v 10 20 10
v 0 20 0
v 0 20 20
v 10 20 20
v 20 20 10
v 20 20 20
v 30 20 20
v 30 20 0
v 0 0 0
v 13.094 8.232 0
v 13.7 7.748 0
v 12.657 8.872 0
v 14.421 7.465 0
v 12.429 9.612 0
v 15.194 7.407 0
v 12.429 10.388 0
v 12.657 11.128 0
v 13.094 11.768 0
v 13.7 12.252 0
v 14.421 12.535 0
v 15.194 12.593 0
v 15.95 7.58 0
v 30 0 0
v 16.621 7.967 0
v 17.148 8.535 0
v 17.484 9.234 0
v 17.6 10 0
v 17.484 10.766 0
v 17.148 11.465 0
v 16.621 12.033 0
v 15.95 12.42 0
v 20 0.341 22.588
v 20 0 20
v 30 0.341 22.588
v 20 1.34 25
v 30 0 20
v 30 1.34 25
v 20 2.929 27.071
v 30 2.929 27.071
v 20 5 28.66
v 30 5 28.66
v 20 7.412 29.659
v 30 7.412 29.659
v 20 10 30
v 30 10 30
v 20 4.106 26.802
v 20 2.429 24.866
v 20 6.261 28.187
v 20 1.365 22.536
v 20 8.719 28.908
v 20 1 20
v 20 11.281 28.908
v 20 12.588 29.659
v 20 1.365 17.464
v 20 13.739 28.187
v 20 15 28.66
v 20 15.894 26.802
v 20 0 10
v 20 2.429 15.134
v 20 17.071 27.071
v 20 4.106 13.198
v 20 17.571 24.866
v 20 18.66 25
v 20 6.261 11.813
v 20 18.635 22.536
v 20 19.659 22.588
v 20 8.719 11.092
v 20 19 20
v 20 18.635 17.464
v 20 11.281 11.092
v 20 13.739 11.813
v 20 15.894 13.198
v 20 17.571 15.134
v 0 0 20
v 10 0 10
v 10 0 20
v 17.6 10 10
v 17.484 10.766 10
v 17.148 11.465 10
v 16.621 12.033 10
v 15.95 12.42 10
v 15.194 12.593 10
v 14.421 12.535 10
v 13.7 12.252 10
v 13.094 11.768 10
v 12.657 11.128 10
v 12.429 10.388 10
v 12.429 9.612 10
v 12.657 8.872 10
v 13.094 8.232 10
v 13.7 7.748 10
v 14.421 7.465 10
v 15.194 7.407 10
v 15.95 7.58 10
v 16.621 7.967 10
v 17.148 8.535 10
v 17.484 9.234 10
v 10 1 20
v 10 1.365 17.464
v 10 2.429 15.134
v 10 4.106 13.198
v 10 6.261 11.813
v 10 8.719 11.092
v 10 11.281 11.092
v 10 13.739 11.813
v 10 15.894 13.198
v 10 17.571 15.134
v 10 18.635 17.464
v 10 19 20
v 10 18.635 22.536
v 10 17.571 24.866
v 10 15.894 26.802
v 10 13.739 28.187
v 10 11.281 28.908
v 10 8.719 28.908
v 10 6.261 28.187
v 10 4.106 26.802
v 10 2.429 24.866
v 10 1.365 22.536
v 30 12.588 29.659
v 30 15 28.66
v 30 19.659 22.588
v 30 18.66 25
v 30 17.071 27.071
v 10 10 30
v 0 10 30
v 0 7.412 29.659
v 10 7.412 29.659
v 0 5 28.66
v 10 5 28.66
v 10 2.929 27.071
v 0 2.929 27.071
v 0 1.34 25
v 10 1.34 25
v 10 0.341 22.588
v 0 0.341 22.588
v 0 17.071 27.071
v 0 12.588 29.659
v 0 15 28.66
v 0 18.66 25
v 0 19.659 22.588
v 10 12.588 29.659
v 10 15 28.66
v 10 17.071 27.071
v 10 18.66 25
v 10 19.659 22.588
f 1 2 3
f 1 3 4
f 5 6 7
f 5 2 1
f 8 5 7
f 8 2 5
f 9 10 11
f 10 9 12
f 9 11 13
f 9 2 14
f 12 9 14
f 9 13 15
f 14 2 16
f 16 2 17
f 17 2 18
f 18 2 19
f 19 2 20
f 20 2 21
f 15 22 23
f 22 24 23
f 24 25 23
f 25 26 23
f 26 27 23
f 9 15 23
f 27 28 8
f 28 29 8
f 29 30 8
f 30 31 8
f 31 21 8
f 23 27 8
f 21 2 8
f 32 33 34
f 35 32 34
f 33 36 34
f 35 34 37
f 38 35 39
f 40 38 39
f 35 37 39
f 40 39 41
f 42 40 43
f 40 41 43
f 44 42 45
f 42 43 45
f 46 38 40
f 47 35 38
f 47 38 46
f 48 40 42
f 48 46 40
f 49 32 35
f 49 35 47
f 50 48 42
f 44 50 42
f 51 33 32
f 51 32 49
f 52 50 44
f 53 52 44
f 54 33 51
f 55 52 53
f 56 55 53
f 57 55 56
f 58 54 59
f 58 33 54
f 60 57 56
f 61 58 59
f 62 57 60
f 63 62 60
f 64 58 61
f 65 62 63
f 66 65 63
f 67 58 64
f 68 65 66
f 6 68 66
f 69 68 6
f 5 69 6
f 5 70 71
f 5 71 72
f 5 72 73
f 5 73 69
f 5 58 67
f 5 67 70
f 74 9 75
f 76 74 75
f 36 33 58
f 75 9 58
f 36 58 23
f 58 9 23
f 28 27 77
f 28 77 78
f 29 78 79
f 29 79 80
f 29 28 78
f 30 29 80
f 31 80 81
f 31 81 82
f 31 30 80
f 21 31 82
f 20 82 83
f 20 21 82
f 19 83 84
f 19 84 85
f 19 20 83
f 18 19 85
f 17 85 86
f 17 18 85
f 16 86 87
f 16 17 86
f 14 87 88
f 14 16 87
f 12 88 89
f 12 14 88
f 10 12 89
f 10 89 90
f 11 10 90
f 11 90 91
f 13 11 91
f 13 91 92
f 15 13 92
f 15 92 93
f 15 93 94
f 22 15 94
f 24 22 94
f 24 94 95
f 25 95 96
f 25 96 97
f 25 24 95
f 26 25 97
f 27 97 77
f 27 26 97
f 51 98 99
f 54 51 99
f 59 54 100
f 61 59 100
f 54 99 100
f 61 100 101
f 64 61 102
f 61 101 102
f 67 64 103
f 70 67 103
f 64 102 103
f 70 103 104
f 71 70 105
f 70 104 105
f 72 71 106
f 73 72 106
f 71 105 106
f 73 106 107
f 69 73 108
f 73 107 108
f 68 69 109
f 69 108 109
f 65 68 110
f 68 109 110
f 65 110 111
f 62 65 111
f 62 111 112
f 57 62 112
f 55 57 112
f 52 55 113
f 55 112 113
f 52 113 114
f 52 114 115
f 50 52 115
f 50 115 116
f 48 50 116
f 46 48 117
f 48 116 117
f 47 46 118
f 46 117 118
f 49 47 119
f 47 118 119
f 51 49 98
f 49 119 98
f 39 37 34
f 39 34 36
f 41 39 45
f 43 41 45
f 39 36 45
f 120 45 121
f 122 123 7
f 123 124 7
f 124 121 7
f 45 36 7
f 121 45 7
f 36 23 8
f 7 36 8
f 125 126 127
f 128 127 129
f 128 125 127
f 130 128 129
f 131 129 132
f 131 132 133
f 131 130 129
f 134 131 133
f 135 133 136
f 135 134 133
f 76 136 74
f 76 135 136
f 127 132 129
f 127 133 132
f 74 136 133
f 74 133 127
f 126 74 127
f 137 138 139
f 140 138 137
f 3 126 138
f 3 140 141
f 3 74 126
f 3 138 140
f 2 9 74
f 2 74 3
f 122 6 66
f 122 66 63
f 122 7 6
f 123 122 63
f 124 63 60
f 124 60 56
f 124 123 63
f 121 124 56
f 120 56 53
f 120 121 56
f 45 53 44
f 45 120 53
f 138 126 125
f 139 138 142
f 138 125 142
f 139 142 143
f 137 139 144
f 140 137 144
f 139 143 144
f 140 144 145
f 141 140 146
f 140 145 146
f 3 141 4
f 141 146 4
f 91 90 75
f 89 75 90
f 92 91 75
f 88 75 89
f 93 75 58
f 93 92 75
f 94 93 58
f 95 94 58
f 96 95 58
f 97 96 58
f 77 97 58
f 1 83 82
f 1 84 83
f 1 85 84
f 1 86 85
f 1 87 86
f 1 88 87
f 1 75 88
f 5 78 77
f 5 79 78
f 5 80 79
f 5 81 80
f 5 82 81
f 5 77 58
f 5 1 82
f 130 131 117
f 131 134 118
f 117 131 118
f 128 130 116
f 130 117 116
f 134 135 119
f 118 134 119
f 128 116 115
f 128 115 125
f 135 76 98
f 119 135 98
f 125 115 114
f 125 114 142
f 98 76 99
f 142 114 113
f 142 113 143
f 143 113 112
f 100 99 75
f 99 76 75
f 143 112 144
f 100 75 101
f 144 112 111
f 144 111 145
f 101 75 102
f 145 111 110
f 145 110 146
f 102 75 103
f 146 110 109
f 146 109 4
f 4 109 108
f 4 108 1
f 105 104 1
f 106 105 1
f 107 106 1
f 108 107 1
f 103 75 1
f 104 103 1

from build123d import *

# Parameters (mm, degrees)
SZKIC1_W                    = 30
SZKIC1_H                    = 20
SZKIC1_R                    = 2.6
DODANIE_WYCI_GNI_CIE1_DEPTH = 10
SZKIC2_W                    = 10
SZKIC2_H                    = 20
DODANIE_WYCI_GNI_CIE2_DEPTH = 20
SZKIC3_R                    = 9
DODANIE_WYCI_GNI_CIE3_DEPTH = 10
ZAOKR_GLENIE1_R             = 10


with BuildPart() as part:
    # Szkic1 → Dodanie-wyciągnięcie1 (new body)
    with BuildSketch(Plane.XY):
        with Locations((15, 10)):
            Rectangle(SZKIC1_W, SZKIC1_H)
        with Locations((15, 10)):
            Circle(SZKIC1_R, mode=Mode.SUBTRACT)
    extrude(amount=DODANIE_WYCI_GNI_CIE1_DEPTH)

    # Szkic2 → Dodanie-wyciągnięcie2 (add)
    with BuildSketch(Plane.XY.offset(10)):
        with Locations((5, 10)):
            Rectangle(SZKIC2_W, SZKIC2_H)
        with Locations((25, 10)):
            Rectangle(SZKIC2_W, SZKIC2_H)
    extrude(amount=DODANIE_WYCI_GNI_CIE2_DEPTH)

    # Szkic3 → Dodanie-wyciągnięcie3 (add)
    with BuildSketch(Plane(origin=(10, 0, 0), x_dir=(0, 0, -1), z_dir=(1, 0, 0))):
        with Locations(Location((-20, 10, 0), (0, 0, 270))):
            Circle(SZKIC3_R)
    extrude(amount=DODANIE_WYCI_GNI_CIE3_DEPTH)

    # Zaokrąglenie1
    zaokr_glenie1_edges = [part.edges().sort_by_distance(p)[0] for p in [
        (25, 0, 30),
        (5, 0, 30),
        (25, 20, 30),
        (5, 20, 30),
    ]]
    fillet(zaokr_glenie1_edges, radius=ZAOKR_GLENIE1_R - 0.0001)  # a hair under: the kernel refuses the full size


solid = part.part
